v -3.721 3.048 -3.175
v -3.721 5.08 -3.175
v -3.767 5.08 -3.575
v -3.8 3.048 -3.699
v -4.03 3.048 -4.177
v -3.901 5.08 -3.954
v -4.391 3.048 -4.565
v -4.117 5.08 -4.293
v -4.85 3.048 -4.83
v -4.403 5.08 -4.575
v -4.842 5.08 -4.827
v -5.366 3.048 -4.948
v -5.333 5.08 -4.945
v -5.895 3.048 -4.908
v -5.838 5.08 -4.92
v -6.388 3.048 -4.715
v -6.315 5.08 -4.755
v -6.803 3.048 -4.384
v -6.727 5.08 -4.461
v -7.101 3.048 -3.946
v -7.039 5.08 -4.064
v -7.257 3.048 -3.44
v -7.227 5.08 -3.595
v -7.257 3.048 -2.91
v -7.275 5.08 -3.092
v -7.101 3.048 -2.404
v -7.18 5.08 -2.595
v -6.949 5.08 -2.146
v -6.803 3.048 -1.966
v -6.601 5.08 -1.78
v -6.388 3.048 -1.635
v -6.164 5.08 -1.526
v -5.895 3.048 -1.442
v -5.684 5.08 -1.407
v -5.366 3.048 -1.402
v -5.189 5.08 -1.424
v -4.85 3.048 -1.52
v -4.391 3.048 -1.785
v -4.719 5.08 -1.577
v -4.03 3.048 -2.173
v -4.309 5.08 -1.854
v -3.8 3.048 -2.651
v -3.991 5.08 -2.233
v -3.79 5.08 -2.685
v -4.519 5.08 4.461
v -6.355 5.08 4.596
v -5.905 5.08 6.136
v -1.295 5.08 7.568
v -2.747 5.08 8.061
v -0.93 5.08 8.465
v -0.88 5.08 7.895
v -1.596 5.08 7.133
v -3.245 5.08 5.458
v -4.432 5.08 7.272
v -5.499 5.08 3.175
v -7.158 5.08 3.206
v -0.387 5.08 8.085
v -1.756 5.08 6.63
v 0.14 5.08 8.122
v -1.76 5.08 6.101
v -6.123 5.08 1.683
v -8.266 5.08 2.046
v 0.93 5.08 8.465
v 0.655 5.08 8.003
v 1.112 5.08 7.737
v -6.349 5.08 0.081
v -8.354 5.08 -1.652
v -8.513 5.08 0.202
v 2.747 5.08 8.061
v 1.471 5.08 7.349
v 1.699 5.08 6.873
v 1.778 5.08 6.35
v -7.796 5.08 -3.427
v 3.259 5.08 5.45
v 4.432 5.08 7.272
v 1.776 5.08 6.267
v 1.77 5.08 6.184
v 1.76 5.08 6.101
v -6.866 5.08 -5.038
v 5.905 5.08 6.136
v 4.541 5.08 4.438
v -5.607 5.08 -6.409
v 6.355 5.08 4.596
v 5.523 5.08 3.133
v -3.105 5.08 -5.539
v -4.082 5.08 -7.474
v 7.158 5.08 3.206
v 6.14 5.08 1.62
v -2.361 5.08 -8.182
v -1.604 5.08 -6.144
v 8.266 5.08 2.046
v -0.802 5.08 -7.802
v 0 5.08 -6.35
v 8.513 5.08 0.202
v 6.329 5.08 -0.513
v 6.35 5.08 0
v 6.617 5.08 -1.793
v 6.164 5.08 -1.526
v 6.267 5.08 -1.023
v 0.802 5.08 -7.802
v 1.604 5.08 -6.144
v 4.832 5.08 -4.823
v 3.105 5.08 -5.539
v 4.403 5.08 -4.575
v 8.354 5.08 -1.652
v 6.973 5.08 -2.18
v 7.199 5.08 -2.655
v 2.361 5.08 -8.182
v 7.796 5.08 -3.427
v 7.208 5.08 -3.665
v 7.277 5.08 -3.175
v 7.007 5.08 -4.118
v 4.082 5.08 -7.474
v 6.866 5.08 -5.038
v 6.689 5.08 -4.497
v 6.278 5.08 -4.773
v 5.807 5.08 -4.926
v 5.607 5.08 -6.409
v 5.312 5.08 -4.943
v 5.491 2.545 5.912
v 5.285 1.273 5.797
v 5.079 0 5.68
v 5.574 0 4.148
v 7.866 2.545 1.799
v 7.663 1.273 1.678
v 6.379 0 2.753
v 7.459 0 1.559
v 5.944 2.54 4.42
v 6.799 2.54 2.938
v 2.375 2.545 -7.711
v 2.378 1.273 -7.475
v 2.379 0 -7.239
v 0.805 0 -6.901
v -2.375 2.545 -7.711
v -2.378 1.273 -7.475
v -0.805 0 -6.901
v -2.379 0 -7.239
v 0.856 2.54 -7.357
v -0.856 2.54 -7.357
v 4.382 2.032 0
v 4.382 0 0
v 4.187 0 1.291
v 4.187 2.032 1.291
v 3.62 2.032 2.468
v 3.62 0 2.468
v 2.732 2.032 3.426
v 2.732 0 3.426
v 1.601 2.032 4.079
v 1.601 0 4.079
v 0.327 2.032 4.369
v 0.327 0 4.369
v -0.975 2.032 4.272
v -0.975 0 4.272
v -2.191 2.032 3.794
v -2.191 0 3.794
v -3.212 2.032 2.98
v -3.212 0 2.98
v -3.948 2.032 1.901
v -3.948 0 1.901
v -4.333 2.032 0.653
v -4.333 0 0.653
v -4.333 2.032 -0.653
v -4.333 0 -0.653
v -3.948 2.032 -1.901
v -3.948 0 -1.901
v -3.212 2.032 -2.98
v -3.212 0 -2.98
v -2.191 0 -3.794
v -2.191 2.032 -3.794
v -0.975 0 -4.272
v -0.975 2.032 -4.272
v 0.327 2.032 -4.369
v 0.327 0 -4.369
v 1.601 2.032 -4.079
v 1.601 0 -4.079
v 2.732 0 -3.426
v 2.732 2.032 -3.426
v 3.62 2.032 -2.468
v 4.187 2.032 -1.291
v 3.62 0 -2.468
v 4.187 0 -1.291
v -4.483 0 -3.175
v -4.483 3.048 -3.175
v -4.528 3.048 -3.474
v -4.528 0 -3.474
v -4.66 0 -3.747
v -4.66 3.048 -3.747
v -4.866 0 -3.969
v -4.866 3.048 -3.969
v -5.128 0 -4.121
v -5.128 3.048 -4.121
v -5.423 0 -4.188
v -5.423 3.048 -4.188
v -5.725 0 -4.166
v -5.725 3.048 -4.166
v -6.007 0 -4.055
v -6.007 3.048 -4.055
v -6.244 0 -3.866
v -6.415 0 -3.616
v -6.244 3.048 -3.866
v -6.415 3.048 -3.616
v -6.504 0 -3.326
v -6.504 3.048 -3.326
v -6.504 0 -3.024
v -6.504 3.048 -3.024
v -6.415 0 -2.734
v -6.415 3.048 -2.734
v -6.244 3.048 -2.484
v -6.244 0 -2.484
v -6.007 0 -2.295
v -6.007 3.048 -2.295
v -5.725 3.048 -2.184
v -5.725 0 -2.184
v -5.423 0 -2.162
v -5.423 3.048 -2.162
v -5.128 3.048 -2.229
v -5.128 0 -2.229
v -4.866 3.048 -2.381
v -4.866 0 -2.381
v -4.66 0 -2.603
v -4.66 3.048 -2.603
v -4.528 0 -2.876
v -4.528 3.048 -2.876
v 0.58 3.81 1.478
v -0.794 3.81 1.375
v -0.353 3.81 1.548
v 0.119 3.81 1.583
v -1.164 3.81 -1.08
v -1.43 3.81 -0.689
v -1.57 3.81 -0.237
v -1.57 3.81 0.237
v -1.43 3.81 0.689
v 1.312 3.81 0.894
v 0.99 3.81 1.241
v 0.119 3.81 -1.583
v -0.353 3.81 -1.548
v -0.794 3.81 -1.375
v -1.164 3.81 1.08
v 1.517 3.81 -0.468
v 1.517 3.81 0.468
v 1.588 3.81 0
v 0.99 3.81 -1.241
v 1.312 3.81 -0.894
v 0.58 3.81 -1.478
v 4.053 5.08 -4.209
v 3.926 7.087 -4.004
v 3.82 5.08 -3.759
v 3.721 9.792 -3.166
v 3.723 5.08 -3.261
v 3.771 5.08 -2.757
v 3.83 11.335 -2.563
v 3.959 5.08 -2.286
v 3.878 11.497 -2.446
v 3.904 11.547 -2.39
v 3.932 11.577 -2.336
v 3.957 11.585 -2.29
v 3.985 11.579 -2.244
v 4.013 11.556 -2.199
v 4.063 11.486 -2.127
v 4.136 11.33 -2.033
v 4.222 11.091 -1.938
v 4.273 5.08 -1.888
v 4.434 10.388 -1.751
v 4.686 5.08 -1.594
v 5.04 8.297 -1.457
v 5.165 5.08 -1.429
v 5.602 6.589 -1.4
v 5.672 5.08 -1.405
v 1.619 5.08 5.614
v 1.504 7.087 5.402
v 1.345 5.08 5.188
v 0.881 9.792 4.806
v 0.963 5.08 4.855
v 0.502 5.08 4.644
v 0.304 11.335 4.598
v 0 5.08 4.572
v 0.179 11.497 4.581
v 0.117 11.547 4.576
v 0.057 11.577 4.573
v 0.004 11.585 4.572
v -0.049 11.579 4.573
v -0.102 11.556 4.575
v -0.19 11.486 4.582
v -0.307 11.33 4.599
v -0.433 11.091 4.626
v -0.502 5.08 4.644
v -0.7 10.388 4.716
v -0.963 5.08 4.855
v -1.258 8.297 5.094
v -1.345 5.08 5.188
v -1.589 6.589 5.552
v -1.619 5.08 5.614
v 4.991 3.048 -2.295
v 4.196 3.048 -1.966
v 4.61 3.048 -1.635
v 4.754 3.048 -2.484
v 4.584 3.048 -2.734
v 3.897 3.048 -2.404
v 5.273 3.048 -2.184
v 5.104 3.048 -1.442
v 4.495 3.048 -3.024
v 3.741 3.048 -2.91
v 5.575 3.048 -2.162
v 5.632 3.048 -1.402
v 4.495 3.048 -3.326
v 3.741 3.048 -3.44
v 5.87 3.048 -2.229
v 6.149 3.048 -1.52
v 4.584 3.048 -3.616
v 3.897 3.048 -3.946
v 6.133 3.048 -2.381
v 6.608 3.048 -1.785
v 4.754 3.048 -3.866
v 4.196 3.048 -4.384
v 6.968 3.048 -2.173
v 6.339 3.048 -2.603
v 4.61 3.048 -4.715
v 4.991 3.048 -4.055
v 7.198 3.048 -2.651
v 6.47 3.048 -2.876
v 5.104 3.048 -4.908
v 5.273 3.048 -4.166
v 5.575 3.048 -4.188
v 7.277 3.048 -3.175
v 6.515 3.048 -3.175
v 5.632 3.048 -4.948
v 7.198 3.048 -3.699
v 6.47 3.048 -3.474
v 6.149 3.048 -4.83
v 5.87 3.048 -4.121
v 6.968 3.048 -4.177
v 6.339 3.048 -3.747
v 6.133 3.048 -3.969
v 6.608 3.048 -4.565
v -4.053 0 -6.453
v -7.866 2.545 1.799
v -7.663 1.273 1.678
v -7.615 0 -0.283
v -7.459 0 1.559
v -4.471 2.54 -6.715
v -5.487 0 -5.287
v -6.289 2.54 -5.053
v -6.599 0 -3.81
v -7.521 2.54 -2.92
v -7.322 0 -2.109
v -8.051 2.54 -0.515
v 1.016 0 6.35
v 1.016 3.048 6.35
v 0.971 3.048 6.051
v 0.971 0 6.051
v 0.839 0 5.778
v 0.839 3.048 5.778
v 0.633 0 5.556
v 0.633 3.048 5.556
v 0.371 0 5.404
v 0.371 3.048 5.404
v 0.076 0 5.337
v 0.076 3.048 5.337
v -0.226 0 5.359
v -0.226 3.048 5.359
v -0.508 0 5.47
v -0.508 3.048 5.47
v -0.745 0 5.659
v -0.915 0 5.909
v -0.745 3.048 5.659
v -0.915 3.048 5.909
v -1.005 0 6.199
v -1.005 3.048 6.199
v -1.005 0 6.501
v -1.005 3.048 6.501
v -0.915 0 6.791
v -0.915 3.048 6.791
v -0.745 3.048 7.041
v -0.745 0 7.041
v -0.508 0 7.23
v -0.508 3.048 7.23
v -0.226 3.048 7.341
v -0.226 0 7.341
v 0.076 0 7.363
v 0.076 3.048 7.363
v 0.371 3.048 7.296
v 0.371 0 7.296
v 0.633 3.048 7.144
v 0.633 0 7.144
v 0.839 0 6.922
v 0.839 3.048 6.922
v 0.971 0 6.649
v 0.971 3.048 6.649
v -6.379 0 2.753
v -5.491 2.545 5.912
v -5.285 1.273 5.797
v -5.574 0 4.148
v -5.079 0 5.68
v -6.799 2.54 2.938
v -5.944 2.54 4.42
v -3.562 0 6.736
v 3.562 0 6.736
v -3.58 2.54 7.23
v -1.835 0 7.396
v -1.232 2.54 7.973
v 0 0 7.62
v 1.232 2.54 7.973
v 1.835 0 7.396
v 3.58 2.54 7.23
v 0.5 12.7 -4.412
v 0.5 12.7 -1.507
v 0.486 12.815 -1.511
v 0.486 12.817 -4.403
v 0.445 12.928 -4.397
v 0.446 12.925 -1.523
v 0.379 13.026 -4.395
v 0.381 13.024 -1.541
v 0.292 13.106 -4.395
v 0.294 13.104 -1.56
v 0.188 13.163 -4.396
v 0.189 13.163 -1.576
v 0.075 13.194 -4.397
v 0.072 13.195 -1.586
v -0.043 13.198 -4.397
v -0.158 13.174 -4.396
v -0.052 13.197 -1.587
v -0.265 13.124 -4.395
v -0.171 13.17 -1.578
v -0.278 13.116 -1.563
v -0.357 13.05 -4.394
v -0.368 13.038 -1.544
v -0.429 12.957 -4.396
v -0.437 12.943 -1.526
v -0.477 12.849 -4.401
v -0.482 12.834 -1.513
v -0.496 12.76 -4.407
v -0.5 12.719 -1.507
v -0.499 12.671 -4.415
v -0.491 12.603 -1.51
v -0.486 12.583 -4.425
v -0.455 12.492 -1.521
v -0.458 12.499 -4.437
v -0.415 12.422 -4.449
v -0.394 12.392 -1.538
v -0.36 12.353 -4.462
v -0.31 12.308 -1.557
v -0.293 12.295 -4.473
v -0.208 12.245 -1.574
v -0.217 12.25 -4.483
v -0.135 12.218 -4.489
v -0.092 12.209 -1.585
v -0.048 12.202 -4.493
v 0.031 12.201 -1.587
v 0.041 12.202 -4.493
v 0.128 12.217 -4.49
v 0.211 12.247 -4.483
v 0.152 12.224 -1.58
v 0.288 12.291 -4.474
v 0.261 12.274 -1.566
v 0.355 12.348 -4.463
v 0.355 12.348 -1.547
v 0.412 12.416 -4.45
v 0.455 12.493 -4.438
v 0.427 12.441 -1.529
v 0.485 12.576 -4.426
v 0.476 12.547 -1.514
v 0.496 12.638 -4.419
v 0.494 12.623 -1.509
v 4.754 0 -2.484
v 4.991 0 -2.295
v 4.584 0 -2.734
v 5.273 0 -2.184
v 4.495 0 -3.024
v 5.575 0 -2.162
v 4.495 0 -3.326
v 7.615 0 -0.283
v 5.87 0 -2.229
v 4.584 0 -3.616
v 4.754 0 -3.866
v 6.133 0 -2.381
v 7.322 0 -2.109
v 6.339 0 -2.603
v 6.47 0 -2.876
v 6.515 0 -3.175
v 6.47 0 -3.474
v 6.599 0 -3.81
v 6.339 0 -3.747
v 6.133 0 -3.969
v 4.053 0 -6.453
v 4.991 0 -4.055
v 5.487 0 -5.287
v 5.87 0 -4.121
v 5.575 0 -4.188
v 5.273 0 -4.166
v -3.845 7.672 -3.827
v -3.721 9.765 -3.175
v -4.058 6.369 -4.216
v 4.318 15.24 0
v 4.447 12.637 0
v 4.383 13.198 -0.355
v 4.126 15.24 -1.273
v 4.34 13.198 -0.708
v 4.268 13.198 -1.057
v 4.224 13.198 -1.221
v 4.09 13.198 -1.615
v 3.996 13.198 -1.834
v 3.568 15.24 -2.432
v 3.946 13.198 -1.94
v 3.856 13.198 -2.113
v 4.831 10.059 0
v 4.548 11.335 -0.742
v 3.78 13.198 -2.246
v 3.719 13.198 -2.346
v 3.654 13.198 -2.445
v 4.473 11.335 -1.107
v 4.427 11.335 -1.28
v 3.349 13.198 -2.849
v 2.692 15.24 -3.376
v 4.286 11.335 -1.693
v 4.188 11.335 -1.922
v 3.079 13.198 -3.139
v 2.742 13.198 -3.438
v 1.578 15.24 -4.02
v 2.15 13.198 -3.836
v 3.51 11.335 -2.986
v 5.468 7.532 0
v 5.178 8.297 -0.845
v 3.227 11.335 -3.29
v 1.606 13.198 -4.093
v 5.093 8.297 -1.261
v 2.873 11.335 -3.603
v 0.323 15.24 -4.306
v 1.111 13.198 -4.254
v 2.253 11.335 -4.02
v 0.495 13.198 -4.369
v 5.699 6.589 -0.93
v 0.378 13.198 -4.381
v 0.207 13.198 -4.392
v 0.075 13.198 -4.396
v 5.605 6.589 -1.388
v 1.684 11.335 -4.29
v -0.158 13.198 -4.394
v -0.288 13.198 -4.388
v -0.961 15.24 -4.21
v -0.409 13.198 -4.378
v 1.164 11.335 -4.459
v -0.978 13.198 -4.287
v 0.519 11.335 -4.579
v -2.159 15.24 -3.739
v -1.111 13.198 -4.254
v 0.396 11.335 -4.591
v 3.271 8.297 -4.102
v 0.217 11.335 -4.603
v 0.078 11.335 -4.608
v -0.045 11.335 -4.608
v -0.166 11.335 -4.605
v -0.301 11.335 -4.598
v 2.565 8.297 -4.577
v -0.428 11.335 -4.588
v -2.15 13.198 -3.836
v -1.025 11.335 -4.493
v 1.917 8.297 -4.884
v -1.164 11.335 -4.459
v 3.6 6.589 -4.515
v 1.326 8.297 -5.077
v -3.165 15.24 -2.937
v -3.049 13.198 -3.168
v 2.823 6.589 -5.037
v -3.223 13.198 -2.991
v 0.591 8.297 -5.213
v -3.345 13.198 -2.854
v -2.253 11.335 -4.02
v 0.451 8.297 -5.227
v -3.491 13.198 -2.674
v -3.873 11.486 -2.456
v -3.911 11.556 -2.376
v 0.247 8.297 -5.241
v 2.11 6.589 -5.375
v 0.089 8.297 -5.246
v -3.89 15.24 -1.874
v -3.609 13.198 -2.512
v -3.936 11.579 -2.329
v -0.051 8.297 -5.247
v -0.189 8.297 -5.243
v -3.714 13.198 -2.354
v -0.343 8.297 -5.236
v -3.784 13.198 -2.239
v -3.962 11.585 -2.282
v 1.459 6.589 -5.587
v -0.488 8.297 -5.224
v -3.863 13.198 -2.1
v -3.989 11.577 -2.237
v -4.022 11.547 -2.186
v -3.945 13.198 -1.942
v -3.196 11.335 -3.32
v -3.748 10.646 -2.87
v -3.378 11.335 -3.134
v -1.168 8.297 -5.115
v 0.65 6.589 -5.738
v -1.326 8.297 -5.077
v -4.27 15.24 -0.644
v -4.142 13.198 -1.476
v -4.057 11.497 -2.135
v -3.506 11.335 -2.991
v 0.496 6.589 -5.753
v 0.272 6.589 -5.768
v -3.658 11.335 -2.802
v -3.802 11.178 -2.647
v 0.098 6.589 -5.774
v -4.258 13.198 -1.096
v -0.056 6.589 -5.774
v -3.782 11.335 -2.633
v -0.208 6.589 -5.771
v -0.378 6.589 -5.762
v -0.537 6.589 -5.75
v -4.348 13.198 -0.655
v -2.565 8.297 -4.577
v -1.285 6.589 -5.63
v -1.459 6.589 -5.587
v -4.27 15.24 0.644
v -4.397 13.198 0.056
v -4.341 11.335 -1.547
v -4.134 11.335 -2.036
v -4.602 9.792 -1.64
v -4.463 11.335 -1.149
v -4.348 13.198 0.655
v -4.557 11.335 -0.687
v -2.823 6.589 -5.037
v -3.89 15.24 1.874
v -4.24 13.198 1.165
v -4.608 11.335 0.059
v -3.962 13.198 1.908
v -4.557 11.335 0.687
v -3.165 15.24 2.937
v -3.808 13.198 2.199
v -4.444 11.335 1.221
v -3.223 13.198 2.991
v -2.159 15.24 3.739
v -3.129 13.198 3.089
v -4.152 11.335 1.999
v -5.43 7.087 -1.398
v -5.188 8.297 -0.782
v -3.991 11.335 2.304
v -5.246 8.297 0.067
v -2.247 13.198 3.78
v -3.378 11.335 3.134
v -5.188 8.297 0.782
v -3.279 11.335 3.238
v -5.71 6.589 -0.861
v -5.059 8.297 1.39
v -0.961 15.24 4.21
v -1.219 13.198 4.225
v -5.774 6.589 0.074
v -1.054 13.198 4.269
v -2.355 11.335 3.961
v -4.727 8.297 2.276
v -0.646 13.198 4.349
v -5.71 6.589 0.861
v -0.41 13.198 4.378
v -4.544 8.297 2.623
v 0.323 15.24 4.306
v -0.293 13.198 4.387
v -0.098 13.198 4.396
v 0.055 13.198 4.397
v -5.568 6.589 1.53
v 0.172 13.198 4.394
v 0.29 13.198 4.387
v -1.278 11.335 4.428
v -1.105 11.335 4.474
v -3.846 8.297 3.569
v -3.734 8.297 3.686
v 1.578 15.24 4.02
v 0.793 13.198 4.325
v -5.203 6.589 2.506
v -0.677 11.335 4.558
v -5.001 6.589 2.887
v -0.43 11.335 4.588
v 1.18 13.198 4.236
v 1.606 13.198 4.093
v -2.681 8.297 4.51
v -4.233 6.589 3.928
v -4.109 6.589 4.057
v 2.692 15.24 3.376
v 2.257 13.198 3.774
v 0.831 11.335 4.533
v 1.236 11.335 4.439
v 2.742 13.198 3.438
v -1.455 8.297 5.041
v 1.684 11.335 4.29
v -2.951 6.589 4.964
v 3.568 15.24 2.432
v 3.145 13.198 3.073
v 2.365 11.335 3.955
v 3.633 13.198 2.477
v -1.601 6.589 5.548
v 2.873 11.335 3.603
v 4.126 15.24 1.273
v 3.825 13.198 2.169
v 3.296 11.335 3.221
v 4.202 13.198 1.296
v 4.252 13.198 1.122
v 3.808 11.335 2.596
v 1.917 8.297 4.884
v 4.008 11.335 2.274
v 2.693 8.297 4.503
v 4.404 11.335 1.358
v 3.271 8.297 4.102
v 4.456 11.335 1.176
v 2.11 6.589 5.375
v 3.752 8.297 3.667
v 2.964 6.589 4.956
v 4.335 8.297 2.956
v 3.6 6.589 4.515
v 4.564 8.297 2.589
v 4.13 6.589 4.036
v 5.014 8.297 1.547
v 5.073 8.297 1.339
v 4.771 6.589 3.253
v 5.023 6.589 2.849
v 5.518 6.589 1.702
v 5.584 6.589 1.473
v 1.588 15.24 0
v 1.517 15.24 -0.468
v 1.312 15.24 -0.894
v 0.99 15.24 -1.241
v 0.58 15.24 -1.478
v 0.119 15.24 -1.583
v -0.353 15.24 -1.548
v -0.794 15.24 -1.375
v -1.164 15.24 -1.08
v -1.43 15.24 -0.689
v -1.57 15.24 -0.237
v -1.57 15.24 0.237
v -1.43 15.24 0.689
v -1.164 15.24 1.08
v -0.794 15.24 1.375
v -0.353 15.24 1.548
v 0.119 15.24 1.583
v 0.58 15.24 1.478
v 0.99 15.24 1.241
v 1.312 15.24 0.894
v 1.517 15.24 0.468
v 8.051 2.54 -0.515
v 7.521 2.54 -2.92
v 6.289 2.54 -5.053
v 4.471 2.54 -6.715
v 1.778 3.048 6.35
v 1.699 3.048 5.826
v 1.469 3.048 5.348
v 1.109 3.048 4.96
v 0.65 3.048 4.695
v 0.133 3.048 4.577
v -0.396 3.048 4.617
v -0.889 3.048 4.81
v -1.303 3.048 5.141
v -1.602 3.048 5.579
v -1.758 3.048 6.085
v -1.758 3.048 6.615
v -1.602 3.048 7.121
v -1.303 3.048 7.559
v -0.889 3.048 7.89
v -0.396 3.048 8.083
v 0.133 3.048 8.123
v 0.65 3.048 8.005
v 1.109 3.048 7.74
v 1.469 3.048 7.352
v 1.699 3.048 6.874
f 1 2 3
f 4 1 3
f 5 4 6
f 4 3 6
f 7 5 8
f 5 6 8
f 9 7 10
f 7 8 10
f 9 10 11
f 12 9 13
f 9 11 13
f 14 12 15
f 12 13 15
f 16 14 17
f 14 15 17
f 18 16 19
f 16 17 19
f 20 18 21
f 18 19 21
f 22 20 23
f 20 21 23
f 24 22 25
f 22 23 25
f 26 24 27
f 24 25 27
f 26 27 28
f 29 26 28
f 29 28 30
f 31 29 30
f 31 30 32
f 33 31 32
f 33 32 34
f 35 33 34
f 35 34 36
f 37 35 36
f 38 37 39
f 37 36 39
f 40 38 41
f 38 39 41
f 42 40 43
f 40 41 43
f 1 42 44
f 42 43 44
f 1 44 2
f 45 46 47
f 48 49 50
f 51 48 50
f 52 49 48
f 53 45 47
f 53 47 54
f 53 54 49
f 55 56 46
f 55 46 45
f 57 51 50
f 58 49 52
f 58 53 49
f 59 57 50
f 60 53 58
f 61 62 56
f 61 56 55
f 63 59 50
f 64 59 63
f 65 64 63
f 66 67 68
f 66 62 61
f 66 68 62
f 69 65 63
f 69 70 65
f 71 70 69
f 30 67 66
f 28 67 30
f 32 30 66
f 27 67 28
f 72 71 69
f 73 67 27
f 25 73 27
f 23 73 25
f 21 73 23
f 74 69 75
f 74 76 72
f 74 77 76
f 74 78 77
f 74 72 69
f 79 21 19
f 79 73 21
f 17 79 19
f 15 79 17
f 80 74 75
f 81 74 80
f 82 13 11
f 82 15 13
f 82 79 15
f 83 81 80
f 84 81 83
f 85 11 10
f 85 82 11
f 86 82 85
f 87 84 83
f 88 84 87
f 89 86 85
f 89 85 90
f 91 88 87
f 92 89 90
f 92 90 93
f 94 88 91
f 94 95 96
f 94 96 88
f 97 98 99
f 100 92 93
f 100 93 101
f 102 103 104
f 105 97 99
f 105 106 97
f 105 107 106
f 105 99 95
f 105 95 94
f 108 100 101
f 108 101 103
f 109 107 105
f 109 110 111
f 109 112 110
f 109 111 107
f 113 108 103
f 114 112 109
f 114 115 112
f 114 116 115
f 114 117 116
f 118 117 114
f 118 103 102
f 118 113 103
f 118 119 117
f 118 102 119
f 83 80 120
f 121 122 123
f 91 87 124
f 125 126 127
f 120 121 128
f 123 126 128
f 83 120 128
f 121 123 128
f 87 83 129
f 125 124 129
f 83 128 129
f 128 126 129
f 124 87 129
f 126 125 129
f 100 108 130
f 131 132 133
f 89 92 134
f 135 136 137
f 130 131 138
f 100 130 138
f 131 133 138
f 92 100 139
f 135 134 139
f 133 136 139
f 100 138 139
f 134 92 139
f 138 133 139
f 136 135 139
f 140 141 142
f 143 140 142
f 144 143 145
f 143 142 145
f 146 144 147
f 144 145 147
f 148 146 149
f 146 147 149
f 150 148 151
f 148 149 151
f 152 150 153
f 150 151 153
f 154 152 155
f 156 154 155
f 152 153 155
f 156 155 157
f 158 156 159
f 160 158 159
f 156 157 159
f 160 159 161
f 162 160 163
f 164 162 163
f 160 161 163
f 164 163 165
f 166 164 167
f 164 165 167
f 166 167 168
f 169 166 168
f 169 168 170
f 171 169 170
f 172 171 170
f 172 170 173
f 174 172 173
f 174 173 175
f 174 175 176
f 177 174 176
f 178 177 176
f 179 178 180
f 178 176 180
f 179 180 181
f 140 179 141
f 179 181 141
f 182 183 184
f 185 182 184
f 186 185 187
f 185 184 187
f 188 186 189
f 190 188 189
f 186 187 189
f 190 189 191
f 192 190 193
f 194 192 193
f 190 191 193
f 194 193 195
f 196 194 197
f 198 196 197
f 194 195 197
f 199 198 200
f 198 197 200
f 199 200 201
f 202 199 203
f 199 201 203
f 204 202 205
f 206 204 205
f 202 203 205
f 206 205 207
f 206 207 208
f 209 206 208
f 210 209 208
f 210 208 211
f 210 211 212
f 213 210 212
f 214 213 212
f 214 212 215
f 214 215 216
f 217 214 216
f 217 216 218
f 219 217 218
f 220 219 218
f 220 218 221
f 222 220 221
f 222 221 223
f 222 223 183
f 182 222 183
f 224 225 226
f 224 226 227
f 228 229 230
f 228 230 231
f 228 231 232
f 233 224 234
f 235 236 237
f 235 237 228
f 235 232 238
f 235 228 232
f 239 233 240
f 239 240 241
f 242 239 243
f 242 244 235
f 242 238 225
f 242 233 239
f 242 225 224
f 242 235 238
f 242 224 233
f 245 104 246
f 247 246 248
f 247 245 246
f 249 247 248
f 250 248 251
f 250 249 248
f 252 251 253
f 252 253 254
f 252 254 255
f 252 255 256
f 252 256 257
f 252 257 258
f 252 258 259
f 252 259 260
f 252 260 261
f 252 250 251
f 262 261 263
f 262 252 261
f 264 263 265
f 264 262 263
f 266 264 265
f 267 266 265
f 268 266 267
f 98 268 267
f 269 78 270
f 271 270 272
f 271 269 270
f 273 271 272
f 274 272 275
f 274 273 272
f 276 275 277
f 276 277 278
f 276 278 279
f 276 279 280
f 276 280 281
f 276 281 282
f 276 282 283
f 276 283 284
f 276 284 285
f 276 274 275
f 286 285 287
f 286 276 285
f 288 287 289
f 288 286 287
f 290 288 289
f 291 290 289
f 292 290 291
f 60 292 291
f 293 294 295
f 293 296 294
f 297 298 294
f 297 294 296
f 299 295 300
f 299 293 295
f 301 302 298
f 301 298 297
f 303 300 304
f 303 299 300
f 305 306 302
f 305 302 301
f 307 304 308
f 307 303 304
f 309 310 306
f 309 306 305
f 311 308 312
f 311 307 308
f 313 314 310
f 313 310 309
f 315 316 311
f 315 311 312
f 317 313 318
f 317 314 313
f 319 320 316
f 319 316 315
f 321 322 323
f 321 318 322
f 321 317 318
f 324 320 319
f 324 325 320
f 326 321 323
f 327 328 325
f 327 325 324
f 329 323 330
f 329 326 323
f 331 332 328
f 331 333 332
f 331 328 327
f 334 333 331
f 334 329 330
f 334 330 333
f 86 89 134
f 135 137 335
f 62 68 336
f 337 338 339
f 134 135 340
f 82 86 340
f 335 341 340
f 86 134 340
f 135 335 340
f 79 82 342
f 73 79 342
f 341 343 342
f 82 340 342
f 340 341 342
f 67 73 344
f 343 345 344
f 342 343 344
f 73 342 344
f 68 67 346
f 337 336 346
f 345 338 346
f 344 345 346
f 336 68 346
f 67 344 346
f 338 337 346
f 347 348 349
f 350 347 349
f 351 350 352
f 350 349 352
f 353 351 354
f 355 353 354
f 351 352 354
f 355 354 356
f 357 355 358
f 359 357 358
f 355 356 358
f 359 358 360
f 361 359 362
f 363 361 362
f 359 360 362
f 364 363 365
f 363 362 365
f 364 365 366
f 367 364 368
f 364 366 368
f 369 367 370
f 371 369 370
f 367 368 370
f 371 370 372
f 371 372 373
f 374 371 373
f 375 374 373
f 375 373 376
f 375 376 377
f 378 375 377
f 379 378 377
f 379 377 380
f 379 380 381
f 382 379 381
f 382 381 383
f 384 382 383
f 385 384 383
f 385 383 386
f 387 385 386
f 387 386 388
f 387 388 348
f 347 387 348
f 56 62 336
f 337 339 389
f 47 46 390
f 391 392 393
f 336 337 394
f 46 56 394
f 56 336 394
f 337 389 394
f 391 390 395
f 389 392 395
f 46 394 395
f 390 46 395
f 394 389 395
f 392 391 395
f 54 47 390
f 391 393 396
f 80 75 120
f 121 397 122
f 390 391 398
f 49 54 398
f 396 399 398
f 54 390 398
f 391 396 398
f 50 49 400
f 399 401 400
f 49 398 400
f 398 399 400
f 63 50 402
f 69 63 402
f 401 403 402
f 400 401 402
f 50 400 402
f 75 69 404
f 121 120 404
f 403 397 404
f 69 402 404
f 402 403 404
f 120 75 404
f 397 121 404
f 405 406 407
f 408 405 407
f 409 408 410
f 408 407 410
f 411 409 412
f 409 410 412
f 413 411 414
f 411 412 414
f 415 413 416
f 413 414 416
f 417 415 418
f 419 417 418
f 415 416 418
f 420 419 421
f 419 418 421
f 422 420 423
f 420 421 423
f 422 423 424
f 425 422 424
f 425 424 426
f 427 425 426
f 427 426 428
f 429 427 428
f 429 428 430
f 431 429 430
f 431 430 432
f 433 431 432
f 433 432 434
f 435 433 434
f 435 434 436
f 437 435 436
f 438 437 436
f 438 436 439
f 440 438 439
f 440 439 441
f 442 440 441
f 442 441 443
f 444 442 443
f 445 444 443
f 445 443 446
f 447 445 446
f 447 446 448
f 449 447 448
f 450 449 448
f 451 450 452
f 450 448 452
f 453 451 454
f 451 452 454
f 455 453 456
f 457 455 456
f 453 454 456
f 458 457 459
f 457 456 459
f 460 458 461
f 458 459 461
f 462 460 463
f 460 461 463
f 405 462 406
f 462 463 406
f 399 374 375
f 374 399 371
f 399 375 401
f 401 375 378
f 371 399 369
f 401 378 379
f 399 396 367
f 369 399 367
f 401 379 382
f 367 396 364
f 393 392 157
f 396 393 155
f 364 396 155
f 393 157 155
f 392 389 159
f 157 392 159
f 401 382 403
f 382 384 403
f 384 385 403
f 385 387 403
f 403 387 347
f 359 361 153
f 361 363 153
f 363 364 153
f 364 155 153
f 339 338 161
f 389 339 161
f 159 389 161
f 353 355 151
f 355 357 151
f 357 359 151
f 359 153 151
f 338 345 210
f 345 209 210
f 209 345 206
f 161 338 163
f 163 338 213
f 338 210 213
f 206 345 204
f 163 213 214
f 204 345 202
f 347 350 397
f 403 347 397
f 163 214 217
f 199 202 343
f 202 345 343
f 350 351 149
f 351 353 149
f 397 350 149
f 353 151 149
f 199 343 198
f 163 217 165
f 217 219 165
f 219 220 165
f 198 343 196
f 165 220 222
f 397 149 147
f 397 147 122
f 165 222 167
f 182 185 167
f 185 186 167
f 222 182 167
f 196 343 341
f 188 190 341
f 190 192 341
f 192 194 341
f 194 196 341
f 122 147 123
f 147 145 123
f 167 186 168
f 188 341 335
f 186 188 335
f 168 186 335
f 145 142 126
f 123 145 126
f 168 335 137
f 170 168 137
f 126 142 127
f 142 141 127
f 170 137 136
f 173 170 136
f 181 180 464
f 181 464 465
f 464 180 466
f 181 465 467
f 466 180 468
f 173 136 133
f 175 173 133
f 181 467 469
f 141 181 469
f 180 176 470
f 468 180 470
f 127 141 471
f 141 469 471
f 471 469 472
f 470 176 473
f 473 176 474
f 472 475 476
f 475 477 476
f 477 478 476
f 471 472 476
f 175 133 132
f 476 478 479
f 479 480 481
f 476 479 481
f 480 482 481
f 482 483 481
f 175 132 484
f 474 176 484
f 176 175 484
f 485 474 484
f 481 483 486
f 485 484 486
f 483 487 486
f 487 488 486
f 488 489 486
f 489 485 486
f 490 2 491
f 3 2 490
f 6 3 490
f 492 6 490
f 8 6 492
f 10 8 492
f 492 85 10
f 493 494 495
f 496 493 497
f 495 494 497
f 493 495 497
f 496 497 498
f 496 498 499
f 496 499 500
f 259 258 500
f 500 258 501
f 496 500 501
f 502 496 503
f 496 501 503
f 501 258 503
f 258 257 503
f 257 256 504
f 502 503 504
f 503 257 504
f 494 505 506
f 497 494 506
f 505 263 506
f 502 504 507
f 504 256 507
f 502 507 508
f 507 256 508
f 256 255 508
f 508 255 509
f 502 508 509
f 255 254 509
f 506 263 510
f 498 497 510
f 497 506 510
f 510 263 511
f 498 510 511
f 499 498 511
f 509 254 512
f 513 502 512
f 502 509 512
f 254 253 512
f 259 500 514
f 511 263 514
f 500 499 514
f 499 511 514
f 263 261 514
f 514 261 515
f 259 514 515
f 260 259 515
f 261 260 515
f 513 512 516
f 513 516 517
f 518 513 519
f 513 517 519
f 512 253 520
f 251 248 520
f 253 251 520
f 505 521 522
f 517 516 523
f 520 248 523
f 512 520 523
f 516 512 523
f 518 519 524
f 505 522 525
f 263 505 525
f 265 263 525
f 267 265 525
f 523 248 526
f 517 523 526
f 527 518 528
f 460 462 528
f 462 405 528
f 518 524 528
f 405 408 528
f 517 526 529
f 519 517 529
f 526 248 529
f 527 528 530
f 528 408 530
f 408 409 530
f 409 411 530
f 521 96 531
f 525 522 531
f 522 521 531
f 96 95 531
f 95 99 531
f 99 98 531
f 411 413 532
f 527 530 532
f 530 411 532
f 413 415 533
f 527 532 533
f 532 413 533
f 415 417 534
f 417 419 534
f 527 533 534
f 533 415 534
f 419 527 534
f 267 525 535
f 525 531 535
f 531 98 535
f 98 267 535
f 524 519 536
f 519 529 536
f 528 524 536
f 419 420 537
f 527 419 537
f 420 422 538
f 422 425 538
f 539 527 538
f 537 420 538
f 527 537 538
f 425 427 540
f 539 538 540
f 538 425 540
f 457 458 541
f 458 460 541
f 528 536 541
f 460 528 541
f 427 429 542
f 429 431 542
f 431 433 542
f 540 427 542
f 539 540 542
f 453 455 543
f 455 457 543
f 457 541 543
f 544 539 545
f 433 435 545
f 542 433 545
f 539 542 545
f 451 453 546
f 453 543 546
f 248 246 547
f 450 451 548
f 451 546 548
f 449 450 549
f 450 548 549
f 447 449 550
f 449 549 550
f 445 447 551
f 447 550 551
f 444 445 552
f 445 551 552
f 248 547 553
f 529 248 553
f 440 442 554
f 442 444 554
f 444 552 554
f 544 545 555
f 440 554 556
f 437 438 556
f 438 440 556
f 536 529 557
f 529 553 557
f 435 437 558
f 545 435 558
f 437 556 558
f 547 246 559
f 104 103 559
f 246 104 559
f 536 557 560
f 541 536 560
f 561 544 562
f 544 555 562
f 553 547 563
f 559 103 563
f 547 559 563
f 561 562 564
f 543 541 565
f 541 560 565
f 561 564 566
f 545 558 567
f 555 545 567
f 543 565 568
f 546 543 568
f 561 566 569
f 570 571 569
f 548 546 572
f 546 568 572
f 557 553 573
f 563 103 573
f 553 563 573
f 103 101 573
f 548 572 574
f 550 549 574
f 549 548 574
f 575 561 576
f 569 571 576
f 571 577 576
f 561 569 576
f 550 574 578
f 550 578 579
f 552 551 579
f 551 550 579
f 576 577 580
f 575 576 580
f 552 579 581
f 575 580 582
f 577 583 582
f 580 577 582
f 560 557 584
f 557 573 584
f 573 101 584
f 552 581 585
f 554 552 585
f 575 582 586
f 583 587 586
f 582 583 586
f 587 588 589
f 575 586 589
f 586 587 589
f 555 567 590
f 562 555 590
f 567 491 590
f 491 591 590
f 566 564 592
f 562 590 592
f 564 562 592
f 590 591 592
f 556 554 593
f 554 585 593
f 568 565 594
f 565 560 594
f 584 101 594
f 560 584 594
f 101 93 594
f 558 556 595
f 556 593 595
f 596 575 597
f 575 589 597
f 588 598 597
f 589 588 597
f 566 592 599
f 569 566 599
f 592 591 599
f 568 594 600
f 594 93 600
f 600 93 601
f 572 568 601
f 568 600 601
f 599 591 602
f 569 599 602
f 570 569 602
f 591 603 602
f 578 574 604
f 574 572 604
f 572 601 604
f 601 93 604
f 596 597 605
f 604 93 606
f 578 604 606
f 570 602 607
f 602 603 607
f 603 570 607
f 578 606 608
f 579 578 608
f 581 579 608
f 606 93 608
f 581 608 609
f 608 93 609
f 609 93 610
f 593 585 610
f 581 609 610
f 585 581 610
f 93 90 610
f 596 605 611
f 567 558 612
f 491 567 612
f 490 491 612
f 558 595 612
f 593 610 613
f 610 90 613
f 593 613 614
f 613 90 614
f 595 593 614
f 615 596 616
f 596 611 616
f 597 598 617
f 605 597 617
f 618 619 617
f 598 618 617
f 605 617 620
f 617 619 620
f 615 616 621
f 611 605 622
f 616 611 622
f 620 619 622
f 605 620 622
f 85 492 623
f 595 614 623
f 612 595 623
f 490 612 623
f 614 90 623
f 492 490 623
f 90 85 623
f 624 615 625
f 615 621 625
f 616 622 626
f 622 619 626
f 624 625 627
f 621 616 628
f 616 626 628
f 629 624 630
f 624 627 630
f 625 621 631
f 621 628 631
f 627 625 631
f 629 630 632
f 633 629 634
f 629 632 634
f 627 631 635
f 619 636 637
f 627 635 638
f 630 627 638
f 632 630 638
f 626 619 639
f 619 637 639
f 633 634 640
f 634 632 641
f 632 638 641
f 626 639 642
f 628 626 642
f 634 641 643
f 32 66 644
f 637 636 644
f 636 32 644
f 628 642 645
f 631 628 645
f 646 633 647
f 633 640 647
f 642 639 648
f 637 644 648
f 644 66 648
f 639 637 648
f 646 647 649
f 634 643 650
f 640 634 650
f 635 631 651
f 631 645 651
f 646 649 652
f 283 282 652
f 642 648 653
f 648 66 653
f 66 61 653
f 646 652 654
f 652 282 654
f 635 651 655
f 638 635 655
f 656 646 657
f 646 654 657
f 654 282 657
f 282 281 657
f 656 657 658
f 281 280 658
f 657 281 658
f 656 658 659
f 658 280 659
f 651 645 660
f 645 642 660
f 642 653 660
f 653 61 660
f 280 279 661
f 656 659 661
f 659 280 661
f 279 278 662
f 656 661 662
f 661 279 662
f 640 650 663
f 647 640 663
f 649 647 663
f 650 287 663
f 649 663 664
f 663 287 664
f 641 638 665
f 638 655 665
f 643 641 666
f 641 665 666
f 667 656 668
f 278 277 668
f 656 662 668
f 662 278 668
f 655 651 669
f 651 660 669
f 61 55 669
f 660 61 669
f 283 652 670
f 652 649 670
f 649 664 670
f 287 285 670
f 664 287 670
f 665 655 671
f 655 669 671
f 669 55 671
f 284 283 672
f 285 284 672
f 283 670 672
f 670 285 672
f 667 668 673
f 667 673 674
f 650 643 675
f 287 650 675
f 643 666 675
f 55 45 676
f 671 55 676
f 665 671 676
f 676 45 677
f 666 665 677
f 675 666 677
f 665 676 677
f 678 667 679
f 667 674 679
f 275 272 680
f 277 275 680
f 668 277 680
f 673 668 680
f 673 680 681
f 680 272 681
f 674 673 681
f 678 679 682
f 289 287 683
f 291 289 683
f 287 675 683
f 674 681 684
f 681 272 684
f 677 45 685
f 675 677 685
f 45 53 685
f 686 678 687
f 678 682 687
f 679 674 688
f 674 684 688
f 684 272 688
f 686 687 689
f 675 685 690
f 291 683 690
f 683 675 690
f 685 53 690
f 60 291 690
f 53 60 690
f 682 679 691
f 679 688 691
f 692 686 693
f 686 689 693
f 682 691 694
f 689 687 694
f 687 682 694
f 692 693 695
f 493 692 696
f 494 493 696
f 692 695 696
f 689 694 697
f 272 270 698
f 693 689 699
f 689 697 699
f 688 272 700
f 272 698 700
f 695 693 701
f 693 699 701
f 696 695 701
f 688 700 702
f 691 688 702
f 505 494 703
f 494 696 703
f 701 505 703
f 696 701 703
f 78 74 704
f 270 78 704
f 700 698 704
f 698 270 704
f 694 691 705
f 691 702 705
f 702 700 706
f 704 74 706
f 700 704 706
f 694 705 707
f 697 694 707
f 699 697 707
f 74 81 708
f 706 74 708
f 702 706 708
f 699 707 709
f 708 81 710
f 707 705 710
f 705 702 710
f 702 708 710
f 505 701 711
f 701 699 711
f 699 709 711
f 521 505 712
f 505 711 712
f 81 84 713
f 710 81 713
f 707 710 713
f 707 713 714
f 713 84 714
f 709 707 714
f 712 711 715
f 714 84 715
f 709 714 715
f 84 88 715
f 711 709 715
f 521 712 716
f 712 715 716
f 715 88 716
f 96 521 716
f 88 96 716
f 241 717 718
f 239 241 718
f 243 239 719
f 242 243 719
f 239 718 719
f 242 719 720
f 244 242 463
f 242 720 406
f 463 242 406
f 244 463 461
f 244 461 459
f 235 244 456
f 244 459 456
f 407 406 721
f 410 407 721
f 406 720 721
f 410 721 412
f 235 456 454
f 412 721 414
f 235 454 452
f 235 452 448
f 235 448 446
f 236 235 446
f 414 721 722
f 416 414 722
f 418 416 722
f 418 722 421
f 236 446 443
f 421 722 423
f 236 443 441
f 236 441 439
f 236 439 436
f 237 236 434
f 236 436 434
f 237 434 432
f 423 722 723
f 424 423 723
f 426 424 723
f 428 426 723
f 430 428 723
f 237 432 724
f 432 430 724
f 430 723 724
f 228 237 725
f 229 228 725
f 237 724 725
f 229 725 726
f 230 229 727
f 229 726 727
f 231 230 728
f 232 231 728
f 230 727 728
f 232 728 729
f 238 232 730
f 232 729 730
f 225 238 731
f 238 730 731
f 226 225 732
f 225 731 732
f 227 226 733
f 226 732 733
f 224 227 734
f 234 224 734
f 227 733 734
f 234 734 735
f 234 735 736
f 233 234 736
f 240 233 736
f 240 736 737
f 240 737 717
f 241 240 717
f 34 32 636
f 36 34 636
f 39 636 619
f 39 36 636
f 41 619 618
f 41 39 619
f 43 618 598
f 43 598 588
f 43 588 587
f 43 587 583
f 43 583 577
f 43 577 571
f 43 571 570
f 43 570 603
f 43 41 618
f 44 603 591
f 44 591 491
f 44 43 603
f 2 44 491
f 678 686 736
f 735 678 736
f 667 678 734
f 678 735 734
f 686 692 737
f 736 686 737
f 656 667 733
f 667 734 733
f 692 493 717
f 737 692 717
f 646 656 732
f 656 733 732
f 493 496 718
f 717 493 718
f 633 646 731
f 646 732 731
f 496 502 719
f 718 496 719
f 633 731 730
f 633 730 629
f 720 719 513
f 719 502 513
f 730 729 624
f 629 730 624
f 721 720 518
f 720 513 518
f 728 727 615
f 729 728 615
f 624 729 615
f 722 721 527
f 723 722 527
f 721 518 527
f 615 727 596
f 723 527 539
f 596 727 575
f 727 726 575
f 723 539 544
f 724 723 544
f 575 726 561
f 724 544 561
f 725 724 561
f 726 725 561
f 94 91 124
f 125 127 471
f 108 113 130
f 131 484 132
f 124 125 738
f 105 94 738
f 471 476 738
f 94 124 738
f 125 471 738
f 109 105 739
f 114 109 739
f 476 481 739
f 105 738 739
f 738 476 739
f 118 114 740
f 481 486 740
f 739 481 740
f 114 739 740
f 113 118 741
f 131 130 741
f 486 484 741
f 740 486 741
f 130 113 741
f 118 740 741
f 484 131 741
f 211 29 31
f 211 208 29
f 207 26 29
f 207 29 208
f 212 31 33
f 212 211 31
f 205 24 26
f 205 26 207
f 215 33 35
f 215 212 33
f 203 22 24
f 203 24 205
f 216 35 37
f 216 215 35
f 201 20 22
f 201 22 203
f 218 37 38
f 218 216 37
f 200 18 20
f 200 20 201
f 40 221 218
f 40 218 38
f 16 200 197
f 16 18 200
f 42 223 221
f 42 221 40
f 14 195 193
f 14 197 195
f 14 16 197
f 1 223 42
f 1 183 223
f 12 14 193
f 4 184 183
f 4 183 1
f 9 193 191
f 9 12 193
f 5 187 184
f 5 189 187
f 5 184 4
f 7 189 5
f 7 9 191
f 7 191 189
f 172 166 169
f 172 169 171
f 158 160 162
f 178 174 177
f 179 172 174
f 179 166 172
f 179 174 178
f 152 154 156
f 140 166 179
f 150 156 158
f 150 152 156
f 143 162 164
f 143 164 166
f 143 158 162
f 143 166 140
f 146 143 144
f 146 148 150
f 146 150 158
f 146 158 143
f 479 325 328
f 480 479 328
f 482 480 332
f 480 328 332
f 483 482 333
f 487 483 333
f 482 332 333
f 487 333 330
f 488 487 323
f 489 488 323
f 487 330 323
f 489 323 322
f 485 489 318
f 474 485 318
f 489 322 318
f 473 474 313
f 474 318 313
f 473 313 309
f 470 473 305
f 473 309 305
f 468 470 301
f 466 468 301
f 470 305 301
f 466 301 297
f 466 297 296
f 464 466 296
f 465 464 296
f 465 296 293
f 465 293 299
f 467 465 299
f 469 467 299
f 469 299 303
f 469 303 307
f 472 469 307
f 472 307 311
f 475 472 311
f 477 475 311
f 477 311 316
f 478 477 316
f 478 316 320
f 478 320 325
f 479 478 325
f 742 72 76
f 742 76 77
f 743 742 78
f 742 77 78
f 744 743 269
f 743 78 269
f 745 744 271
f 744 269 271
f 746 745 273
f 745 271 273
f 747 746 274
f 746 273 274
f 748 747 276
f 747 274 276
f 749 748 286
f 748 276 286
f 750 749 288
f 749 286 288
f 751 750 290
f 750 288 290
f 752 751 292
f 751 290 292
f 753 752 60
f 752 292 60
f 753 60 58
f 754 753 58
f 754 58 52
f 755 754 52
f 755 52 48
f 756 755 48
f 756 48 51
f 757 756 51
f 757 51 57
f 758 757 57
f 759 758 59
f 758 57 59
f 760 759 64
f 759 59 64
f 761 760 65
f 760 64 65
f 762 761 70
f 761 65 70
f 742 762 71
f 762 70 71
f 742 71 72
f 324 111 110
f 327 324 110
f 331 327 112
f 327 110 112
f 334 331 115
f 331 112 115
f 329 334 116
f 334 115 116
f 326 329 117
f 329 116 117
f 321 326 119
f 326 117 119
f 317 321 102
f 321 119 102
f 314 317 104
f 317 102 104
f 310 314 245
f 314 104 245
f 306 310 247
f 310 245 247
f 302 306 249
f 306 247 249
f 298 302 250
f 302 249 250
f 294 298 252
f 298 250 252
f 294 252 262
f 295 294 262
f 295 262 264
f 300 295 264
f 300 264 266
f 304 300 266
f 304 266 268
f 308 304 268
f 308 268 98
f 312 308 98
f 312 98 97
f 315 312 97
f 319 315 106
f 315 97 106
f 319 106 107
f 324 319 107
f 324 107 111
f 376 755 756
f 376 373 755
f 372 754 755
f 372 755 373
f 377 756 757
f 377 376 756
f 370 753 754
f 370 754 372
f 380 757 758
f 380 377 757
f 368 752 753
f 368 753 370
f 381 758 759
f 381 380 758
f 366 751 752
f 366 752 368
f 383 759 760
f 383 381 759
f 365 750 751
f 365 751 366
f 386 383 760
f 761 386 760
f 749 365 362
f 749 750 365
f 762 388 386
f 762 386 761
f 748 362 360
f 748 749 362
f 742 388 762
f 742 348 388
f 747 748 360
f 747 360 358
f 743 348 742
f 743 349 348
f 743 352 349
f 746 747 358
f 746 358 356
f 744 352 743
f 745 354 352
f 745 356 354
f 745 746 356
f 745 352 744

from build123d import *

# Parameters (mm, degrees)
BOSS_EXTRUDE1_DEPTH     = 5.08
BOSS_EXTRUDE1_DRAFT     = -10
SKETCH2_R               = 1.016
CUT_EXTRUDE1_DEPTH      = 6.08
SKETCH3_R               = 1.778
CUT_EXTRUDE2_DEPTH      = 2.032
SKETCH4_R               = 4.3815
CUT_EXTRUDE3_DEPTH      = 2.032
SKETCH3_2_R             = 1.778
CUT_EXTRUDE4_DEPTH      = 10.16
CUT_EXTRUDE4_DEPTH_BACK = 2.032
SKETCH7_R               = 1.5875
CUT_EXTRUDE5_DEPTH      = 11.43
SKETCH8_R               = 0.5
CUT_EXTRUDE6_DEPTH      = 9.181885328


with BuildPart() as part:
    # Sketch1 → Boss-Extrude1 (with draft: the straight prism first)
    with BuildSketch(Plane(origin=(0, 0, 0), x_dir=(1, 0, 0), z_dir=(0, 1, 0))):
        with BuildLine():
            ThreePointArc((7.458830017, -1.558927446), (6.599113577, 3.81), (2.379344237, 7.239))
            ThreePointArc((2.379344237, 7.239), (0, 6.858), (-2.379344237, 7.239))
            ThreePointArc((-2.379344237, 7.239), (-6.599113577, 3.81), (-7.458830017, -1.558927446))
            ThreePointArc((-7.458830017, -1.558927446), (-5.939202219, -3.429), (-5.079485779, -5.680072554))
            ThreePointArc((-5.079485779, -5.680072554), (0, -7.62), (5.079485779, -5.680072554))
            ThreePointArc((5.079485779, -5.680072554), (5.939202219, -3.429), (7.458830017, -1.558927446))
        make_face()
    extrude(amount=BOSS_EXTRUDE1_DEPTH)
    # Boss-Extrude1: the draft: its side faces are tilted about the plane it starts from
    boss_extrude1_sides = [part.faces().sort_by_distance(p)[0] for p in [
        (5.939202219, 2.54, 3.429),
        (6.599113577, 2.54, -3.81),
        (0, 2.54, -6.858),
        (-6.599113577, 2.54, -3.81),
        (-5.939202219, 2.54, 3.429),
        (0, 2.54, 7.62),
    ]]
    draft(boss_extrude1_sides, Plane(origin=(0, 0, 0), x_dir=(1, 0, 0), z_dir=(0, 1, 0)), BOSS_EXTRUDE1_DRAFT)

    # Sketch2 → Cut-Extrude1 (cut, through all)
    with BuildSketch(Plane(origin=(0, 5.08, 0), x_dir=(1, 0, 0), z_dir=(0, 1, 0))):
        with Locations((0, -6.35)):
            Circle(SKETCH2_R)
        with Locations((-5.499261314, 3.175)):
            Circle(SKETCH2_R)
        with Locations((5.499261314, 3.175)):
            Circle(SKETCH2_R)
    extrude(amount=-CUT_EXTRUDE1_DEPTH, mode=Mode.SUBTRACT)

    # Sketch3 → Cut-Extrude2 (cut)
    with BuildSketch(Plane(origin=(0, 5.08, 0), x_dir=(1, 0, 0), z_dir=(0, 1, 0))):
        with Locations((0, -6.35)):
            Circle(SKETCH3_R)
        with Locations((-5.499261314, 3.175)):
            Circle(SKETCH3_R)
        with Locations((5.499261314, 3.175)):
            Circle(SKETCH3_R)
    extrude(amount=-CUT_EXTRUDE2_DEPTH, mode=Mode.SUBTRACT)

    # Sketch4 → Cut-Extrude3 (cut)
    with BuildSketch(Plane.XZ):
        Circle(SKETCH4_R)
    extrude(amount=-CUT_EXTRUDE3_DEPTH, mode=Mode.SUBTRACT)

    # Sketch6 → Revolve1 (revolve)
    with BuildSketch(Plane.XY):
        with BuildLine():
            Line((0, 5.08), (0, 15.24))
            Line((0, 15.24), (4.318, 15.24))
            ThreePointArc((4.318, 15.24), (4.830980871, 10.059396174), (6.35, 5.08))
            Line((6.35, 5.08), (0, 5.08))
        make_face()
    revolve(axis=Axis((0, 5.08, 0), (0, 1, 0)))

    # Sketch3<2> → Cut-Extrude4 (cut, two sides)
    with BuildSketch(Plane(origin=(0, 5.08, 0), x_dir=(1, 0, 0), z_dir=(0, 1, 0))) as cut_extrude4_sk:
        with Locations((0, -6.35)):
            Circle(SKETCH3_2_R)
        with Locations((-5.499261314, 3.175)):
            Circle(SKETCH3_2_R)
        with Locations((5.499261314, 3.175)):
            Circle(SKETCH3_2_R)
    extrude(amount=CUT_EXTRUDE4_DEPTH, mode=Mode.SUBTRACT)
    extrude(cut_extrude4_sk.sketch, amount=-CUT_EXTRUDE4_DEPTH_BACK, mode=Mode.SUBTRACT)

    # Sketch7 → Cut-Extrude5 (cut)
    with BuildSketch(Plane(origin=(0, 15.24, 0), x_dir=(1, 0, 0), z_dir=(0, 1, 0))):
        Circle(SKETCH7_R)
    extrude(amount=-CUT_EXTRUDE5_DEPTH, mode=Mode.SUBTRACT)

    # Sketch8 → Cut-Extrude6 (cut, through all)
    with BuildSketch(Plane.XY):
        with Locations((0, 12.7)):
            Circle(SKETCH8_R)
    extrude(amount=-CUT_EXTRUDE6_DEPTH, mode=Mode.SUBTRACT)


solid = part.part
